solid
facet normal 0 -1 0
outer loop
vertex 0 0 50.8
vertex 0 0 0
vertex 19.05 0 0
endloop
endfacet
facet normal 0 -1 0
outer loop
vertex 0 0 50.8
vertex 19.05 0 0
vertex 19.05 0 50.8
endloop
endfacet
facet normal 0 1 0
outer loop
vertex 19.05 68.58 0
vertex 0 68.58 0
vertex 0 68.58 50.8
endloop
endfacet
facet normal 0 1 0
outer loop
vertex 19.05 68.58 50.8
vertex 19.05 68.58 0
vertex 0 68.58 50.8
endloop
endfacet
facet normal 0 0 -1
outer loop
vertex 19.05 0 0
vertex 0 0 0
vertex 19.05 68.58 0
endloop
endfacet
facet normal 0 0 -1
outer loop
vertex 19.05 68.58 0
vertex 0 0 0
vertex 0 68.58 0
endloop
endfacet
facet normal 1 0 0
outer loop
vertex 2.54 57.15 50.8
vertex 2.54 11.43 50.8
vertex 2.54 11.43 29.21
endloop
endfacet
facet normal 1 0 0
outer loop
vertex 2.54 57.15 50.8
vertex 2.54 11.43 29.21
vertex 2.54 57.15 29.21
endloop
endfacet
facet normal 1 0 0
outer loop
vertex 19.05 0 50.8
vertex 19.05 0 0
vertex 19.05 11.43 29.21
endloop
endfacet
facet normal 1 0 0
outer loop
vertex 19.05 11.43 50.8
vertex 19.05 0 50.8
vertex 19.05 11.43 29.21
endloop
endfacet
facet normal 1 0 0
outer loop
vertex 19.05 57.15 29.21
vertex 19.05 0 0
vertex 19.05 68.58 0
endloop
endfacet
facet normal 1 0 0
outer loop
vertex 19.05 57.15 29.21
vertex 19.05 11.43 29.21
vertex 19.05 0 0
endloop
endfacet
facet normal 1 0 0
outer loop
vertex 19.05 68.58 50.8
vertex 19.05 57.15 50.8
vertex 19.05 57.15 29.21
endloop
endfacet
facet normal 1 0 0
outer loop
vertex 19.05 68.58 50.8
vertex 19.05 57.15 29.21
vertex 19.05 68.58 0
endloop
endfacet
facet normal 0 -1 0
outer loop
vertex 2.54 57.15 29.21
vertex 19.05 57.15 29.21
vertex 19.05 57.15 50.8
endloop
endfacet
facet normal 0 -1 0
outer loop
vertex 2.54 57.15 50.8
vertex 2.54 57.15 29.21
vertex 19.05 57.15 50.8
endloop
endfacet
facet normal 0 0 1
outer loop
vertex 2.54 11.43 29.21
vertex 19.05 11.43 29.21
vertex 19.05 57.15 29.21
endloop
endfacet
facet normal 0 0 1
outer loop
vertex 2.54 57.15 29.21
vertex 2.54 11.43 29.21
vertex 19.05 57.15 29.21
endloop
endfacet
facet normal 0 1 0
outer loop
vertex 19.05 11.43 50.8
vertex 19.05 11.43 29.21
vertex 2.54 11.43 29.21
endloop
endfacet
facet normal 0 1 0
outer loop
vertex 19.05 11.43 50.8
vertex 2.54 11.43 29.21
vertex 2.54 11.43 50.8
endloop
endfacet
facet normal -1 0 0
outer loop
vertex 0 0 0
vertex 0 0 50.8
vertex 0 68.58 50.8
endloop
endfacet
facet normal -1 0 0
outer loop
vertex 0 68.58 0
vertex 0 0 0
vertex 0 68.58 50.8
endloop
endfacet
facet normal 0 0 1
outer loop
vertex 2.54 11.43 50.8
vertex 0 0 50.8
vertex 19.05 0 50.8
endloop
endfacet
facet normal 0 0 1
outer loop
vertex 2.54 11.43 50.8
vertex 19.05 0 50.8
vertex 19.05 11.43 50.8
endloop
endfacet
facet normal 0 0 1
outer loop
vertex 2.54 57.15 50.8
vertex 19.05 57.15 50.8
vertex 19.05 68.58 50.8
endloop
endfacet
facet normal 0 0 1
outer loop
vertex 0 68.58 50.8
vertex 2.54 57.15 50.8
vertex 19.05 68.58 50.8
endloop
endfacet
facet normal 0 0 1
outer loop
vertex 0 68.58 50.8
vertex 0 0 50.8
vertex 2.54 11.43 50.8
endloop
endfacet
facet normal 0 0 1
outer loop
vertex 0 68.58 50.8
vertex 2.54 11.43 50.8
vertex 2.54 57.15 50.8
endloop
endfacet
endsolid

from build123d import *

# Parameters (mm, degrees)
SKETCH1_W           = 68.58
SKETCH1_H           = 50.8
BOSS_EXTRUDE1_DEPTH = 19.05
SKETCH2_W           = 45.72
SKETCH2_H           = 21.59
CUT_EXTRUDE1_DEPTH  = 16.51


with BuildPart() as part:
    # Sketch1 → Boss-Extrude1 (new body)
    with BuildSketch(Plane.YZ):
        with Locations((34.29, 25.4)):
            Rectangle(SKETCH1_W, SKETCH1_H)
    extrude(amount=BOSS_EXTRUDE1_DEPTH)

    # Sketch2 → Cut-Extrude1 (cut)
    with BuildSketch(Plane.YZ.offset(19.05)):
        with Locations((34.29, 40.005)):
            Rectangle(SKETCH2_W, SKETCH2_H)
    extrude(amount=-CUT_EXTRUDE1_DEPTH, mode=Mode.SUBTRACT)


solid = part.part
